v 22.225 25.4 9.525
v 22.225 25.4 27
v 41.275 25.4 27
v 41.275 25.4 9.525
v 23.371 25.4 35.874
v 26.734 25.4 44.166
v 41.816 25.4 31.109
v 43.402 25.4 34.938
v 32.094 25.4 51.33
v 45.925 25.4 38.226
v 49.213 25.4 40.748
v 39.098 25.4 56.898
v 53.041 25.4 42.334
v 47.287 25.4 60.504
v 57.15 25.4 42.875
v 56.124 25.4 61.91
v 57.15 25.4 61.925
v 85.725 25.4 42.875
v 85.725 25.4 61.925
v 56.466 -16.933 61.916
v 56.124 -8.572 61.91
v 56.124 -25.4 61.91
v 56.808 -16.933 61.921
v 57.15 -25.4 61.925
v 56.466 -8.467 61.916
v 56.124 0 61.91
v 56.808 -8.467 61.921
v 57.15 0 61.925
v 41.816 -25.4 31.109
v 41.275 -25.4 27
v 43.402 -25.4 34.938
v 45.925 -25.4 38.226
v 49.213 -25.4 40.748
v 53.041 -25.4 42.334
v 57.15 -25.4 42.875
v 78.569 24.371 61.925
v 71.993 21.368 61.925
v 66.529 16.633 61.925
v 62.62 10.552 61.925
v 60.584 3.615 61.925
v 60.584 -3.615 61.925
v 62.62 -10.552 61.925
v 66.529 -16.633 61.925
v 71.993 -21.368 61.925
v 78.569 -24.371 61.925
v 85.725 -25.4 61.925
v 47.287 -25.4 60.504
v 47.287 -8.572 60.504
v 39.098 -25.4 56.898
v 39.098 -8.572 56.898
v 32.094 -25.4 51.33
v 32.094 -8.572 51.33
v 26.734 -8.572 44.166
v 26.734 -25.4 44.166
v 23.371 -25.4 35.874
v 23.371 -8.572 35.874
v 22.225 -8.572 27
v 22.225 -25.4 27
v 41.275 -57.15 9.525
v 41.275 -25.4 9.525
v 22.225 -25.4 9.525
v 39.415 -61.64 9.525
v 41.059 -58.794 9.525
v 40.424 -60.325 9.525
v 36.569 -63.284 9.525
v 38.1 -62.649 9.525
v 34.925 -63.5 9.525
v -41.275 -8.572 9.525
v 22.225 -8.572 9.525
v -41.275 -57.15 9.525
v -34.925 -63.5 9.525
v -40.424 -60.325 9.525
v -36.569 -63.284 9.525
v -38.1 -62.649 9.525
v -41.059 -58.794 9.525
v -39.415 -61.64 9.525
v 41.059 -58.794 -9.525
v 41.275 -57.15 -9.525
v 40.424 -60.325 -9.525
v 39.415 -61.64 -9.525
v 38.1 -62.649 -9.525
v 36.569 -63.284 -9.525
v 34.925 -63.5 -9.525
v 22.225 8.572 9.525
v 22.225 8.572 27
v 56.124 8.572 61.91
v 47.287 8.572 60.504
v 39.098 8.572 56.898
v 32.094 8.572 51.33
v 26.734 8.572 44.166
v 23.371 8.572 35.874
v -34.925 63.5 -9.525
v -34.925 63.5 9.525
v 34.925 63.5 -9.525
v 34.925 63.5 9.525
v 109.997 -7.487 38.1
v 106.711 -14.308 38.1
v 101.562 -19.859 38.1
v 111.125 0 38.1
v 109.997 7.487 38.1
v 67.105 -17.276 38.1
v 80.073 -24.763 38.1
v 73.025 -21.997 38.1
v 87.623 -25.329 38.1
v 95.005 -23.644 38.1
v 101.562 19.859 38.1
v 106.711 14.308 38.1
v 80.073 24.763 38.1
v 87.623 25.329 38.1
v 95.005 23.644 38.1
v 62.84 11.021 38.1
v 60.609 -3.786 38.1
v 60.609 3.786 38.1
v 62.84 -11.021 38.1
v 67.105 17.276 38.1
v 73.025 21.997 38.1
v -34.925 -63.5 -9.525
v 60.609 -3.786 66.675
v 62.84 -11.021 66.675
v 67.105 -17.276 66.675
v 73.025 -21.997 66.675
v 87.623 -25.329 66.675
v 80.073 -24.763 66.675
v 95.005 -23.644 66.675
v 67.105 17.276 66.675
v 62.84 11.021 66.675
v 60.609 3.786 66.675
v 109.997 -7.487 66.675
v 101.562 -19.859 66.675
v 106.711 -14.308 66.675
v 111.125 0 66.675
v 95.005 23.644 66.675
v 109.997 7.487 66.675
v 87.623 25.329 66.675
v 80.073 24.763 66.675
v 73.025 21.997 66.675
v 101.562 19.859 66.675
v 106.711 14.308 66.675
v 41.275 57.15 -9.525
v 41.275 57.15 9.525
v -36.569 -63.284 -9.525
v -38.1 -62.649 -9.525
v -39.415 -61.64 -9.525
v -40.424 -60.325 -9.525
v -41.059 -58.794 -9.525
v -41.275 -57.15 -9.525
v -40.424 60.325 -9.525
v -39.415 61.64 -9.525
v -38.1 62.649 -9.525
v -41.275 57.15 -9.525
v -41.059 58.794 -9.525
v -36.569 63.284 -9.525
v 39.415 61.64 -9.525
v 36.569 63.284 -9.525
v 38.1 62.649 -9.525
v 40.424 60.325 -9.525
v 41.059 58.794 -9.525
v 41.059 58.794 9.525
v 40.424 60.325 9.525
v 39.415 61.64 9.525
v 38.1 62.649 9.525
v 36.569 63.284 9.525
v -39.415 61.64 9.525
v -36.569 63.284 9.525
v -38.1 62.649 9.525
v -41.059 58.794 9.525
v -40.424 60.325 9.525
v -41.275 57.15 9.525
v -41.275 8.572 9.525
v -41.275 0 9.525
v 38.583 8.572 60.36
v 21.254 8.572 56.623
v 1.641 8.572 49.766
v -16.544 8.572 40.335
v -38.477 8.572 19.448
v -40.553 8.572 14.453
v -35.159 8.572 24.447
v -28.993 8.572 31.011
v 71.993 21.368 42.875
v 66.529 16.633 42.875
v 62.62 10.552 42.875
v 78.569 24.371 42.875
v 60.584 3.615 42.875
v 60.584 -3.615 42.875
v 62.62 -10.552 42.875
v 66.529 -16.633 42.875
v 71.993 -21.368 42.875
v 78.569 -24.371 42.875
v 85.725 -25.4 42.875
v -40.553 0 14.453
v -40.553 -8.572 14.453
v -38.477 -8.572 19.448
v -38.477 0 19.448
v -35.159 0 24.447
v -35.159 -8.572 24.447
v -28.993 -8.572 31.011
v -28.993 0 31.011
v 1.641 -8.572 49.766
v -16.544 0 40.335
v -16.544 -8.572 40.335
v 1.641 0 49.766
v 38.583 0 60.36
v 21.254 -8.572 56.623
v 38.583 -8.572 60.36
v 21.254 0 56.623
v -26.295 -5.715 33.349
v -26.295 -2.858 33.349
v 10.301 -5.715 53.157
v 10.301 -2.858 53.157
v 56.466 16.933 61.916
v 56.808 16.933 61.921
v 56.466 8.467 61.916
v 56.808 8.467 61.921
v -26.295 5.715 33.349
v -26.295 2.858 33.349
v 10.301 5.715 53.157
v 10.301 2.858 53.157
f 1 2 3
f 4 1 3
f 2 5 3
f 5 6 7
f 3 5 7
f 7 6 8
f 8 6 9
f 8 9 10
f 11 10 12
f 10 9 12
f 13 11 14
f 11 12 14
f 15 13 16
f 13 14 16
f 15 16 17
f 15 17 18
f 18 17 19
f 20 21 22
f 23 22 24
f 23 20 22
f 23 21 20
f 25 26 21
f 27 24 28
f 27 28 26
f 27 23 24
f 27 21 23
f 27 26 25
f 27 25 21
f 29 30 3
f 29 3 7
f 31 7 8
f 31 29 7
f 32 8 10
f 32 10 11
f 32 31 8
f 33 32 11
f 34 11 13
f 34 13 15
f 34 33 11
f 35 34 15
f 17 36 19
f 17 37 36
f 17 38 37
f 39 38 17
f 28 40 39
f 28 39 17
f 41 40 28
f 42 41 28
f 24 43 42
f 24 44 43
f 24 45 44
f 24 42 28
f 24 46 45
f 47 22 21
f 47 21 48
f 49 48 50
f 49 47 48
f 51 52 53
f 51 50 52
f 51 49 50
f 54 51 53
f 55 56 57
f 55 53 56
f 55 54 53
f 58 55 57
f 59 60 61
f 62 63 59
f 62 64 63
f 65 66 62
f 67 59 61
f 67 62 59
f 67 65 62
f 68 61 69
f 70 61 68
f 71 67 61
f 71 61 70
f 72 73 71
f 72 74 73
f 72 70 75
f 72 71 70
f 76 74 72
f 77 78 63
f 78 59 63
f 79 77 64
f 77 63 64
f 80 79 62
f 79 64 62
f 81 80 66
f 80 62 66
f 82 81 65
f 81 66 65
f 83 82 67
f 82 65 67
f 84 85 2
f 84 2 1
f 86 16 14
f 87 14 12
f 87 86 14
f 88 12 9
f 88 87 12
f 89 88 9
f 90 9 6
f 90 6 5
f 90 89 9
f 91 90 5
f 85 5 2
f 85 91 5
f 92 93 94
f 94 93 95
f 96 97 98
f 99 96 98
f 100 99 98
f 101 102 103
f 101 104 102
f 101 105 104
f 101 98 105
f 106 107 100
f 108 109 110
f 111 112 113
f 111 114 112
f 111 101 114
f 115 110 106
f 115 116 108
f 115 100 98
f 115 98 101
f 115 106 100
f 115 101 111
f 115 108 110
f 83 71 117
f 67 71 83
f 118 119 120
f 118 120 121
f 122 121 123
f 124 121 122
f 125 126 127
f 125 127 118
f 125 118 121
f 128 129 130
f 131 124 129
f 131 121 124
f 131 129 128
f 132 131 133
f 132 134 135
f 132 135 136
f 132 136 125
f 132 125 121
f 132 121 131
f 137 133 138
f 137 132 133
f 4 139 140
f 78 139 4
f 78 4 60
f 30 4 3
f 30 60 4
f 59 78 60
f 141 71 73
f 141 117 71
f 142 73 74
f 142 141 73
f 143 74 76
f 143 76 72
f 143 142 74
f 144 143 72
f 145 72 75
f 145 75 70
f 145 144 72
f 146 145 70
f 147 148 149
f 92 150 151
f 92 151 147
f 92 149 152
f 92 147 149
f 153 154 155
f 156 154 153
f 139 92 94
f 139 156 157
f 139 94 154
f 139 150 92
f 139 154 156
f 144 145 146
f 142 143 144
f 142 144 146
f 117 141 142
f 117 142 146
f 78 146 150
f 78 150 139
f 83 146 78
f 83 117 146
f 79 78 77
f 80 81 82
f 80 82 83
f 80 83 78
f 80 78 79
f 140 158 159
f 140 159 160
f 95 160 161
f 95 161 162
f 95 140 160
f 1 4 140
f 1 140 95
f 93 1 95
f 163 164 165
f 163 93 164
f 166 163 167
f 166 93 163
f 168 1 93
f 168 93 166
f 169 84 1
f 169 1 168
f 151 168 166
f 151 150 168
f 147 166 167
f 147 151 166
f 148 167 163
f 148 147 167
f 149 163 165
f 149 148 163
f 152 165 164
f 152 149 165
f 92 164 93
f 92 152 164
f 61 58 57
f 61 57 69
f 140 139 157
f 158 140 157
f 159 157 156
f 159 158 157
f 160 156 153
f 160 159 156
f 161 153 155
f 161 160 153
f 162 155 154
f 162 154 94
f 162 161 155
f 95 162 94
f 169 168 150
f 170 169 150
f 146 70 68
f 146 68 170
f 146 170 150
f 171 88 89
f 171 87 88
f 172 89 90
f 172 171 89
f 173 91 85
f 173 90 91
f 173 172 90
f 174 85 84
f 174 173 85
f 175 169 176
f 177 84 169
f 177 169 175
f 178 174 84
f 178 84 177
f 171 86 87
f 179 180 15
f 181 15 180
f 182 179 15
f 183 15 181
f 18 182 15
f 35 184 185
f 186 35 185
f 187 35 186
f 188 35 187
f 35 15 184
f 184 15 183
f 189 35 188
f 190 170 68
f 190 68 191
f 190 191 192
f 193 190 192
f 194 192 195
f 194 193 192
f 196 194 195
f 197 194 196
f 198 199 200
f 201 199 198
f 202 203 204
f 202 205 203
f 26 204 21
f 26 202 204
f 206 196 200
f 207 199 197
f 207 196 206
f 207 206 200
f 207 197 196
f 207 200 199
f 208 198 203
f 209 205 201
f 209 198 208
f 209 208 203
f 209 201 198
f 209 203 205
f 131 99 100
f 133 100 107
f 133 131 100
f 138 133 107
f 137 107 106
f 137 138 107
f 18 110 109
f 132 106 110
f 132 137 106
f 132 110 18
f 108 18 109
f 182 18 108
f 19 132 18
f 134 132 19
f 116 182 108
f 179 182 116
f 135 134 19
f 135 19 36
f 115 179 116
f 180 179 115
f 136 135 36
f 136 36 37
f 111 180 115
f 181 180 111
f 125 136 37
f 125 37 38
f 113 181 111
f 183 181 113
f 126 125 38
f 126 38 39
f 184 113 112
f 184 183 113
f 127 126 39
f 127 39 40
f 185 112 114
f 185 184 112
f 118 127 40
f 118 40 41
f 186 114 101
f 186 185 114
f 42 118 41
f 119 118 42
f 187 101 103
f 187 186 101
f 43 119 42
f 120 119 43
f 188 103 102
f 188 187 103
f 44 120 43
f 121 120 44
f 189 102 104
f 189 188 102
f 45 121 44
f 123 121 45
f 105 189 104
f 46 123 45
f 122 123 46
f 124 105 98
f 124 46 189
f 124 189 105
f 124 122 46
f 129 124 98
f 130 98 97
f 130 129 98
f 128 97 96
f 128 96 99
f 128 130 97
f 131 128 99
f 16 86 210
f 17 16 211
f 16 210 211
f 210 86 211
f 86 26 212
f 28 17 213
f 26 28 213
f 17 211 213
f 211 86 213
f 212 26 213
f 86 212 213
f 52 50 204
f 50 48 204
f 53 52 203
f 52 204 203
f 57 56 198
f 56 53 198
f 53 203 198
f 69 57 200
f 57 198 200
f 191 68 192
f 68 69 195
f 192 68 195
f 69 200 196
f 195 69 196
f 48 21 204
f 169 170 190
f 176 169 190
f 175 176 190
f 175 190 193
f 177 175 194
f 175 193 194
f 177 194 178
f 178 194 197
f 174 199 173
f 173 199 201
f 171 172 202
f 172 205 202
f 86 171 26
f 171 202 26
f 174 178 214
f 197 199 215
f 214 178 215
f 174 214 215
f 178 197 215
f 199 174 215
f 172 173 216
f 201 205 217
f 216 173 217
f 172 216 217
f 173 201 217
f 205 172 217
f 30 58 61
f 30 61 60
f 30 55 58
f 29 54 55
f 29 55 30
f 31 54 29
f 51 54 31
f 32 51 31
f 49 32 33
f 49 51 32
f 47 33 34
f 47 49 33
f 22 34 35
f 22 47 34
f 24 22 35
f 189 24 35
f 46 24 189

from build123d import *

# Parameters (mm, degrees)
F1_DEPTH = 63.5
F0_W     = 25.4
F0_H     = 19.05
F2_DEPTH = 25.4
F3_DEPTH = 8.5725
F5_R     = 6.35


with BuildPart() as f1:
    # F0 (on Front) → F1 (new body, symmetric)
    with BuildSketch(Plane.XZ):
        Polygon((-41.275, 9.525), (-41.275, -9.525), (41.275, -9.525), (41.275, 9.525), (22.225, 9.525), align=None)
    extrude(amount=F1_DEPTH, both=True)

    # F0 (on Front) → F2 (join, symmetric)
    with BuildSketch(Plane.XZ):
        with BuildLine():
            Line((22.225, 9.525), (41.275, 9.525))
            Line((41.275, 9.525), (41.275, 27.0002))
            ThreePointArc((41.275, 27.0002), (45.9246798487, 38.2255201513), (57.15, 42.8752))
            Line((57.15, 42.8752), (60.325, 42.8752))
            Line((60.325, 42.8752), (60.325, 61.9252))
            Line((60.325, 61.9252), (57.15, 61.9252))
            add(Edge.make_bspline(
                [(56.1238979845, 61.9101232261), (56.4661986033, 61.9166358314), (56.8082401142, 61.9216656861), (57.15, 61.9252)],
                knots=[110.6863449834, 110.6863449834, 110.6863449834, 110.6863449834, 111.5045361635, 111.5045361635, 111.5045361635, 111.5045361635], degree=3))
            ThreePointArc((56.1238979845, 61.9101232261), (32.0941400278, 51.3304179615), (22.225, 27.0002))
            Line((22.225, 27.0002), (22.225, 9.525))
        make_face()
        with Locations((73.025, 52.4002)):
            Rectangle(F0_W, F0_H)
    extrude(amount=F2_DEPTH, both=True)

    # F0 (on Front) → F3 (join, symmetric)
    with BuildSketch(Plane.XZ):
        with BuildLine():
            add(Edge.make_bspline(
                [(-41.275, 9.525), (-41.2321390497, 33.0120007106), (9.8168669335, 61.0290865026), (56.1238979845, 61.9101232261)],
                knots=[0, 0, 0, 0, 110.6863449834, 110.6863449834, 110.6863449834, 110.6863449834], degree=3))
            Line((-41.275, 9.525), (22.225, 9.525))
            Line((22.225, 9.525), (22.225, 27.0002))
            ThreePointArc((22.225, 27.0002), (32.0941400278, 51.3304179615), (56.1238979845, 61.9101232261))
        make_face()
    extrude(amount=F3_DEPTH, both=True)

    # F0 (on Front) → F4 (revolve)
    with BuildSketch(Plane.XZ):
        Polygon((85.725, 66.675), (85.725, 61.9252), (85.725, 42.8752), (85.725, 38.1), (111.125, 38.1), (111.125, 66.675), align=None)
    revolve(axis=Axis((85.725, 0, 52.3875), (0, 0, 1)))

    # F5
    f5_edges = [f1.edges().sort_by_distance(p)[0] for p in [
        (-41.275, -63.5, 0),
        (41.275, -63.5, 0),
        (41.275, 63.5, 0),
        (-41.275, 63.5, 0),
    ]]
    fillet(f5_edges, radius=F5_R)


solid = f1.part
